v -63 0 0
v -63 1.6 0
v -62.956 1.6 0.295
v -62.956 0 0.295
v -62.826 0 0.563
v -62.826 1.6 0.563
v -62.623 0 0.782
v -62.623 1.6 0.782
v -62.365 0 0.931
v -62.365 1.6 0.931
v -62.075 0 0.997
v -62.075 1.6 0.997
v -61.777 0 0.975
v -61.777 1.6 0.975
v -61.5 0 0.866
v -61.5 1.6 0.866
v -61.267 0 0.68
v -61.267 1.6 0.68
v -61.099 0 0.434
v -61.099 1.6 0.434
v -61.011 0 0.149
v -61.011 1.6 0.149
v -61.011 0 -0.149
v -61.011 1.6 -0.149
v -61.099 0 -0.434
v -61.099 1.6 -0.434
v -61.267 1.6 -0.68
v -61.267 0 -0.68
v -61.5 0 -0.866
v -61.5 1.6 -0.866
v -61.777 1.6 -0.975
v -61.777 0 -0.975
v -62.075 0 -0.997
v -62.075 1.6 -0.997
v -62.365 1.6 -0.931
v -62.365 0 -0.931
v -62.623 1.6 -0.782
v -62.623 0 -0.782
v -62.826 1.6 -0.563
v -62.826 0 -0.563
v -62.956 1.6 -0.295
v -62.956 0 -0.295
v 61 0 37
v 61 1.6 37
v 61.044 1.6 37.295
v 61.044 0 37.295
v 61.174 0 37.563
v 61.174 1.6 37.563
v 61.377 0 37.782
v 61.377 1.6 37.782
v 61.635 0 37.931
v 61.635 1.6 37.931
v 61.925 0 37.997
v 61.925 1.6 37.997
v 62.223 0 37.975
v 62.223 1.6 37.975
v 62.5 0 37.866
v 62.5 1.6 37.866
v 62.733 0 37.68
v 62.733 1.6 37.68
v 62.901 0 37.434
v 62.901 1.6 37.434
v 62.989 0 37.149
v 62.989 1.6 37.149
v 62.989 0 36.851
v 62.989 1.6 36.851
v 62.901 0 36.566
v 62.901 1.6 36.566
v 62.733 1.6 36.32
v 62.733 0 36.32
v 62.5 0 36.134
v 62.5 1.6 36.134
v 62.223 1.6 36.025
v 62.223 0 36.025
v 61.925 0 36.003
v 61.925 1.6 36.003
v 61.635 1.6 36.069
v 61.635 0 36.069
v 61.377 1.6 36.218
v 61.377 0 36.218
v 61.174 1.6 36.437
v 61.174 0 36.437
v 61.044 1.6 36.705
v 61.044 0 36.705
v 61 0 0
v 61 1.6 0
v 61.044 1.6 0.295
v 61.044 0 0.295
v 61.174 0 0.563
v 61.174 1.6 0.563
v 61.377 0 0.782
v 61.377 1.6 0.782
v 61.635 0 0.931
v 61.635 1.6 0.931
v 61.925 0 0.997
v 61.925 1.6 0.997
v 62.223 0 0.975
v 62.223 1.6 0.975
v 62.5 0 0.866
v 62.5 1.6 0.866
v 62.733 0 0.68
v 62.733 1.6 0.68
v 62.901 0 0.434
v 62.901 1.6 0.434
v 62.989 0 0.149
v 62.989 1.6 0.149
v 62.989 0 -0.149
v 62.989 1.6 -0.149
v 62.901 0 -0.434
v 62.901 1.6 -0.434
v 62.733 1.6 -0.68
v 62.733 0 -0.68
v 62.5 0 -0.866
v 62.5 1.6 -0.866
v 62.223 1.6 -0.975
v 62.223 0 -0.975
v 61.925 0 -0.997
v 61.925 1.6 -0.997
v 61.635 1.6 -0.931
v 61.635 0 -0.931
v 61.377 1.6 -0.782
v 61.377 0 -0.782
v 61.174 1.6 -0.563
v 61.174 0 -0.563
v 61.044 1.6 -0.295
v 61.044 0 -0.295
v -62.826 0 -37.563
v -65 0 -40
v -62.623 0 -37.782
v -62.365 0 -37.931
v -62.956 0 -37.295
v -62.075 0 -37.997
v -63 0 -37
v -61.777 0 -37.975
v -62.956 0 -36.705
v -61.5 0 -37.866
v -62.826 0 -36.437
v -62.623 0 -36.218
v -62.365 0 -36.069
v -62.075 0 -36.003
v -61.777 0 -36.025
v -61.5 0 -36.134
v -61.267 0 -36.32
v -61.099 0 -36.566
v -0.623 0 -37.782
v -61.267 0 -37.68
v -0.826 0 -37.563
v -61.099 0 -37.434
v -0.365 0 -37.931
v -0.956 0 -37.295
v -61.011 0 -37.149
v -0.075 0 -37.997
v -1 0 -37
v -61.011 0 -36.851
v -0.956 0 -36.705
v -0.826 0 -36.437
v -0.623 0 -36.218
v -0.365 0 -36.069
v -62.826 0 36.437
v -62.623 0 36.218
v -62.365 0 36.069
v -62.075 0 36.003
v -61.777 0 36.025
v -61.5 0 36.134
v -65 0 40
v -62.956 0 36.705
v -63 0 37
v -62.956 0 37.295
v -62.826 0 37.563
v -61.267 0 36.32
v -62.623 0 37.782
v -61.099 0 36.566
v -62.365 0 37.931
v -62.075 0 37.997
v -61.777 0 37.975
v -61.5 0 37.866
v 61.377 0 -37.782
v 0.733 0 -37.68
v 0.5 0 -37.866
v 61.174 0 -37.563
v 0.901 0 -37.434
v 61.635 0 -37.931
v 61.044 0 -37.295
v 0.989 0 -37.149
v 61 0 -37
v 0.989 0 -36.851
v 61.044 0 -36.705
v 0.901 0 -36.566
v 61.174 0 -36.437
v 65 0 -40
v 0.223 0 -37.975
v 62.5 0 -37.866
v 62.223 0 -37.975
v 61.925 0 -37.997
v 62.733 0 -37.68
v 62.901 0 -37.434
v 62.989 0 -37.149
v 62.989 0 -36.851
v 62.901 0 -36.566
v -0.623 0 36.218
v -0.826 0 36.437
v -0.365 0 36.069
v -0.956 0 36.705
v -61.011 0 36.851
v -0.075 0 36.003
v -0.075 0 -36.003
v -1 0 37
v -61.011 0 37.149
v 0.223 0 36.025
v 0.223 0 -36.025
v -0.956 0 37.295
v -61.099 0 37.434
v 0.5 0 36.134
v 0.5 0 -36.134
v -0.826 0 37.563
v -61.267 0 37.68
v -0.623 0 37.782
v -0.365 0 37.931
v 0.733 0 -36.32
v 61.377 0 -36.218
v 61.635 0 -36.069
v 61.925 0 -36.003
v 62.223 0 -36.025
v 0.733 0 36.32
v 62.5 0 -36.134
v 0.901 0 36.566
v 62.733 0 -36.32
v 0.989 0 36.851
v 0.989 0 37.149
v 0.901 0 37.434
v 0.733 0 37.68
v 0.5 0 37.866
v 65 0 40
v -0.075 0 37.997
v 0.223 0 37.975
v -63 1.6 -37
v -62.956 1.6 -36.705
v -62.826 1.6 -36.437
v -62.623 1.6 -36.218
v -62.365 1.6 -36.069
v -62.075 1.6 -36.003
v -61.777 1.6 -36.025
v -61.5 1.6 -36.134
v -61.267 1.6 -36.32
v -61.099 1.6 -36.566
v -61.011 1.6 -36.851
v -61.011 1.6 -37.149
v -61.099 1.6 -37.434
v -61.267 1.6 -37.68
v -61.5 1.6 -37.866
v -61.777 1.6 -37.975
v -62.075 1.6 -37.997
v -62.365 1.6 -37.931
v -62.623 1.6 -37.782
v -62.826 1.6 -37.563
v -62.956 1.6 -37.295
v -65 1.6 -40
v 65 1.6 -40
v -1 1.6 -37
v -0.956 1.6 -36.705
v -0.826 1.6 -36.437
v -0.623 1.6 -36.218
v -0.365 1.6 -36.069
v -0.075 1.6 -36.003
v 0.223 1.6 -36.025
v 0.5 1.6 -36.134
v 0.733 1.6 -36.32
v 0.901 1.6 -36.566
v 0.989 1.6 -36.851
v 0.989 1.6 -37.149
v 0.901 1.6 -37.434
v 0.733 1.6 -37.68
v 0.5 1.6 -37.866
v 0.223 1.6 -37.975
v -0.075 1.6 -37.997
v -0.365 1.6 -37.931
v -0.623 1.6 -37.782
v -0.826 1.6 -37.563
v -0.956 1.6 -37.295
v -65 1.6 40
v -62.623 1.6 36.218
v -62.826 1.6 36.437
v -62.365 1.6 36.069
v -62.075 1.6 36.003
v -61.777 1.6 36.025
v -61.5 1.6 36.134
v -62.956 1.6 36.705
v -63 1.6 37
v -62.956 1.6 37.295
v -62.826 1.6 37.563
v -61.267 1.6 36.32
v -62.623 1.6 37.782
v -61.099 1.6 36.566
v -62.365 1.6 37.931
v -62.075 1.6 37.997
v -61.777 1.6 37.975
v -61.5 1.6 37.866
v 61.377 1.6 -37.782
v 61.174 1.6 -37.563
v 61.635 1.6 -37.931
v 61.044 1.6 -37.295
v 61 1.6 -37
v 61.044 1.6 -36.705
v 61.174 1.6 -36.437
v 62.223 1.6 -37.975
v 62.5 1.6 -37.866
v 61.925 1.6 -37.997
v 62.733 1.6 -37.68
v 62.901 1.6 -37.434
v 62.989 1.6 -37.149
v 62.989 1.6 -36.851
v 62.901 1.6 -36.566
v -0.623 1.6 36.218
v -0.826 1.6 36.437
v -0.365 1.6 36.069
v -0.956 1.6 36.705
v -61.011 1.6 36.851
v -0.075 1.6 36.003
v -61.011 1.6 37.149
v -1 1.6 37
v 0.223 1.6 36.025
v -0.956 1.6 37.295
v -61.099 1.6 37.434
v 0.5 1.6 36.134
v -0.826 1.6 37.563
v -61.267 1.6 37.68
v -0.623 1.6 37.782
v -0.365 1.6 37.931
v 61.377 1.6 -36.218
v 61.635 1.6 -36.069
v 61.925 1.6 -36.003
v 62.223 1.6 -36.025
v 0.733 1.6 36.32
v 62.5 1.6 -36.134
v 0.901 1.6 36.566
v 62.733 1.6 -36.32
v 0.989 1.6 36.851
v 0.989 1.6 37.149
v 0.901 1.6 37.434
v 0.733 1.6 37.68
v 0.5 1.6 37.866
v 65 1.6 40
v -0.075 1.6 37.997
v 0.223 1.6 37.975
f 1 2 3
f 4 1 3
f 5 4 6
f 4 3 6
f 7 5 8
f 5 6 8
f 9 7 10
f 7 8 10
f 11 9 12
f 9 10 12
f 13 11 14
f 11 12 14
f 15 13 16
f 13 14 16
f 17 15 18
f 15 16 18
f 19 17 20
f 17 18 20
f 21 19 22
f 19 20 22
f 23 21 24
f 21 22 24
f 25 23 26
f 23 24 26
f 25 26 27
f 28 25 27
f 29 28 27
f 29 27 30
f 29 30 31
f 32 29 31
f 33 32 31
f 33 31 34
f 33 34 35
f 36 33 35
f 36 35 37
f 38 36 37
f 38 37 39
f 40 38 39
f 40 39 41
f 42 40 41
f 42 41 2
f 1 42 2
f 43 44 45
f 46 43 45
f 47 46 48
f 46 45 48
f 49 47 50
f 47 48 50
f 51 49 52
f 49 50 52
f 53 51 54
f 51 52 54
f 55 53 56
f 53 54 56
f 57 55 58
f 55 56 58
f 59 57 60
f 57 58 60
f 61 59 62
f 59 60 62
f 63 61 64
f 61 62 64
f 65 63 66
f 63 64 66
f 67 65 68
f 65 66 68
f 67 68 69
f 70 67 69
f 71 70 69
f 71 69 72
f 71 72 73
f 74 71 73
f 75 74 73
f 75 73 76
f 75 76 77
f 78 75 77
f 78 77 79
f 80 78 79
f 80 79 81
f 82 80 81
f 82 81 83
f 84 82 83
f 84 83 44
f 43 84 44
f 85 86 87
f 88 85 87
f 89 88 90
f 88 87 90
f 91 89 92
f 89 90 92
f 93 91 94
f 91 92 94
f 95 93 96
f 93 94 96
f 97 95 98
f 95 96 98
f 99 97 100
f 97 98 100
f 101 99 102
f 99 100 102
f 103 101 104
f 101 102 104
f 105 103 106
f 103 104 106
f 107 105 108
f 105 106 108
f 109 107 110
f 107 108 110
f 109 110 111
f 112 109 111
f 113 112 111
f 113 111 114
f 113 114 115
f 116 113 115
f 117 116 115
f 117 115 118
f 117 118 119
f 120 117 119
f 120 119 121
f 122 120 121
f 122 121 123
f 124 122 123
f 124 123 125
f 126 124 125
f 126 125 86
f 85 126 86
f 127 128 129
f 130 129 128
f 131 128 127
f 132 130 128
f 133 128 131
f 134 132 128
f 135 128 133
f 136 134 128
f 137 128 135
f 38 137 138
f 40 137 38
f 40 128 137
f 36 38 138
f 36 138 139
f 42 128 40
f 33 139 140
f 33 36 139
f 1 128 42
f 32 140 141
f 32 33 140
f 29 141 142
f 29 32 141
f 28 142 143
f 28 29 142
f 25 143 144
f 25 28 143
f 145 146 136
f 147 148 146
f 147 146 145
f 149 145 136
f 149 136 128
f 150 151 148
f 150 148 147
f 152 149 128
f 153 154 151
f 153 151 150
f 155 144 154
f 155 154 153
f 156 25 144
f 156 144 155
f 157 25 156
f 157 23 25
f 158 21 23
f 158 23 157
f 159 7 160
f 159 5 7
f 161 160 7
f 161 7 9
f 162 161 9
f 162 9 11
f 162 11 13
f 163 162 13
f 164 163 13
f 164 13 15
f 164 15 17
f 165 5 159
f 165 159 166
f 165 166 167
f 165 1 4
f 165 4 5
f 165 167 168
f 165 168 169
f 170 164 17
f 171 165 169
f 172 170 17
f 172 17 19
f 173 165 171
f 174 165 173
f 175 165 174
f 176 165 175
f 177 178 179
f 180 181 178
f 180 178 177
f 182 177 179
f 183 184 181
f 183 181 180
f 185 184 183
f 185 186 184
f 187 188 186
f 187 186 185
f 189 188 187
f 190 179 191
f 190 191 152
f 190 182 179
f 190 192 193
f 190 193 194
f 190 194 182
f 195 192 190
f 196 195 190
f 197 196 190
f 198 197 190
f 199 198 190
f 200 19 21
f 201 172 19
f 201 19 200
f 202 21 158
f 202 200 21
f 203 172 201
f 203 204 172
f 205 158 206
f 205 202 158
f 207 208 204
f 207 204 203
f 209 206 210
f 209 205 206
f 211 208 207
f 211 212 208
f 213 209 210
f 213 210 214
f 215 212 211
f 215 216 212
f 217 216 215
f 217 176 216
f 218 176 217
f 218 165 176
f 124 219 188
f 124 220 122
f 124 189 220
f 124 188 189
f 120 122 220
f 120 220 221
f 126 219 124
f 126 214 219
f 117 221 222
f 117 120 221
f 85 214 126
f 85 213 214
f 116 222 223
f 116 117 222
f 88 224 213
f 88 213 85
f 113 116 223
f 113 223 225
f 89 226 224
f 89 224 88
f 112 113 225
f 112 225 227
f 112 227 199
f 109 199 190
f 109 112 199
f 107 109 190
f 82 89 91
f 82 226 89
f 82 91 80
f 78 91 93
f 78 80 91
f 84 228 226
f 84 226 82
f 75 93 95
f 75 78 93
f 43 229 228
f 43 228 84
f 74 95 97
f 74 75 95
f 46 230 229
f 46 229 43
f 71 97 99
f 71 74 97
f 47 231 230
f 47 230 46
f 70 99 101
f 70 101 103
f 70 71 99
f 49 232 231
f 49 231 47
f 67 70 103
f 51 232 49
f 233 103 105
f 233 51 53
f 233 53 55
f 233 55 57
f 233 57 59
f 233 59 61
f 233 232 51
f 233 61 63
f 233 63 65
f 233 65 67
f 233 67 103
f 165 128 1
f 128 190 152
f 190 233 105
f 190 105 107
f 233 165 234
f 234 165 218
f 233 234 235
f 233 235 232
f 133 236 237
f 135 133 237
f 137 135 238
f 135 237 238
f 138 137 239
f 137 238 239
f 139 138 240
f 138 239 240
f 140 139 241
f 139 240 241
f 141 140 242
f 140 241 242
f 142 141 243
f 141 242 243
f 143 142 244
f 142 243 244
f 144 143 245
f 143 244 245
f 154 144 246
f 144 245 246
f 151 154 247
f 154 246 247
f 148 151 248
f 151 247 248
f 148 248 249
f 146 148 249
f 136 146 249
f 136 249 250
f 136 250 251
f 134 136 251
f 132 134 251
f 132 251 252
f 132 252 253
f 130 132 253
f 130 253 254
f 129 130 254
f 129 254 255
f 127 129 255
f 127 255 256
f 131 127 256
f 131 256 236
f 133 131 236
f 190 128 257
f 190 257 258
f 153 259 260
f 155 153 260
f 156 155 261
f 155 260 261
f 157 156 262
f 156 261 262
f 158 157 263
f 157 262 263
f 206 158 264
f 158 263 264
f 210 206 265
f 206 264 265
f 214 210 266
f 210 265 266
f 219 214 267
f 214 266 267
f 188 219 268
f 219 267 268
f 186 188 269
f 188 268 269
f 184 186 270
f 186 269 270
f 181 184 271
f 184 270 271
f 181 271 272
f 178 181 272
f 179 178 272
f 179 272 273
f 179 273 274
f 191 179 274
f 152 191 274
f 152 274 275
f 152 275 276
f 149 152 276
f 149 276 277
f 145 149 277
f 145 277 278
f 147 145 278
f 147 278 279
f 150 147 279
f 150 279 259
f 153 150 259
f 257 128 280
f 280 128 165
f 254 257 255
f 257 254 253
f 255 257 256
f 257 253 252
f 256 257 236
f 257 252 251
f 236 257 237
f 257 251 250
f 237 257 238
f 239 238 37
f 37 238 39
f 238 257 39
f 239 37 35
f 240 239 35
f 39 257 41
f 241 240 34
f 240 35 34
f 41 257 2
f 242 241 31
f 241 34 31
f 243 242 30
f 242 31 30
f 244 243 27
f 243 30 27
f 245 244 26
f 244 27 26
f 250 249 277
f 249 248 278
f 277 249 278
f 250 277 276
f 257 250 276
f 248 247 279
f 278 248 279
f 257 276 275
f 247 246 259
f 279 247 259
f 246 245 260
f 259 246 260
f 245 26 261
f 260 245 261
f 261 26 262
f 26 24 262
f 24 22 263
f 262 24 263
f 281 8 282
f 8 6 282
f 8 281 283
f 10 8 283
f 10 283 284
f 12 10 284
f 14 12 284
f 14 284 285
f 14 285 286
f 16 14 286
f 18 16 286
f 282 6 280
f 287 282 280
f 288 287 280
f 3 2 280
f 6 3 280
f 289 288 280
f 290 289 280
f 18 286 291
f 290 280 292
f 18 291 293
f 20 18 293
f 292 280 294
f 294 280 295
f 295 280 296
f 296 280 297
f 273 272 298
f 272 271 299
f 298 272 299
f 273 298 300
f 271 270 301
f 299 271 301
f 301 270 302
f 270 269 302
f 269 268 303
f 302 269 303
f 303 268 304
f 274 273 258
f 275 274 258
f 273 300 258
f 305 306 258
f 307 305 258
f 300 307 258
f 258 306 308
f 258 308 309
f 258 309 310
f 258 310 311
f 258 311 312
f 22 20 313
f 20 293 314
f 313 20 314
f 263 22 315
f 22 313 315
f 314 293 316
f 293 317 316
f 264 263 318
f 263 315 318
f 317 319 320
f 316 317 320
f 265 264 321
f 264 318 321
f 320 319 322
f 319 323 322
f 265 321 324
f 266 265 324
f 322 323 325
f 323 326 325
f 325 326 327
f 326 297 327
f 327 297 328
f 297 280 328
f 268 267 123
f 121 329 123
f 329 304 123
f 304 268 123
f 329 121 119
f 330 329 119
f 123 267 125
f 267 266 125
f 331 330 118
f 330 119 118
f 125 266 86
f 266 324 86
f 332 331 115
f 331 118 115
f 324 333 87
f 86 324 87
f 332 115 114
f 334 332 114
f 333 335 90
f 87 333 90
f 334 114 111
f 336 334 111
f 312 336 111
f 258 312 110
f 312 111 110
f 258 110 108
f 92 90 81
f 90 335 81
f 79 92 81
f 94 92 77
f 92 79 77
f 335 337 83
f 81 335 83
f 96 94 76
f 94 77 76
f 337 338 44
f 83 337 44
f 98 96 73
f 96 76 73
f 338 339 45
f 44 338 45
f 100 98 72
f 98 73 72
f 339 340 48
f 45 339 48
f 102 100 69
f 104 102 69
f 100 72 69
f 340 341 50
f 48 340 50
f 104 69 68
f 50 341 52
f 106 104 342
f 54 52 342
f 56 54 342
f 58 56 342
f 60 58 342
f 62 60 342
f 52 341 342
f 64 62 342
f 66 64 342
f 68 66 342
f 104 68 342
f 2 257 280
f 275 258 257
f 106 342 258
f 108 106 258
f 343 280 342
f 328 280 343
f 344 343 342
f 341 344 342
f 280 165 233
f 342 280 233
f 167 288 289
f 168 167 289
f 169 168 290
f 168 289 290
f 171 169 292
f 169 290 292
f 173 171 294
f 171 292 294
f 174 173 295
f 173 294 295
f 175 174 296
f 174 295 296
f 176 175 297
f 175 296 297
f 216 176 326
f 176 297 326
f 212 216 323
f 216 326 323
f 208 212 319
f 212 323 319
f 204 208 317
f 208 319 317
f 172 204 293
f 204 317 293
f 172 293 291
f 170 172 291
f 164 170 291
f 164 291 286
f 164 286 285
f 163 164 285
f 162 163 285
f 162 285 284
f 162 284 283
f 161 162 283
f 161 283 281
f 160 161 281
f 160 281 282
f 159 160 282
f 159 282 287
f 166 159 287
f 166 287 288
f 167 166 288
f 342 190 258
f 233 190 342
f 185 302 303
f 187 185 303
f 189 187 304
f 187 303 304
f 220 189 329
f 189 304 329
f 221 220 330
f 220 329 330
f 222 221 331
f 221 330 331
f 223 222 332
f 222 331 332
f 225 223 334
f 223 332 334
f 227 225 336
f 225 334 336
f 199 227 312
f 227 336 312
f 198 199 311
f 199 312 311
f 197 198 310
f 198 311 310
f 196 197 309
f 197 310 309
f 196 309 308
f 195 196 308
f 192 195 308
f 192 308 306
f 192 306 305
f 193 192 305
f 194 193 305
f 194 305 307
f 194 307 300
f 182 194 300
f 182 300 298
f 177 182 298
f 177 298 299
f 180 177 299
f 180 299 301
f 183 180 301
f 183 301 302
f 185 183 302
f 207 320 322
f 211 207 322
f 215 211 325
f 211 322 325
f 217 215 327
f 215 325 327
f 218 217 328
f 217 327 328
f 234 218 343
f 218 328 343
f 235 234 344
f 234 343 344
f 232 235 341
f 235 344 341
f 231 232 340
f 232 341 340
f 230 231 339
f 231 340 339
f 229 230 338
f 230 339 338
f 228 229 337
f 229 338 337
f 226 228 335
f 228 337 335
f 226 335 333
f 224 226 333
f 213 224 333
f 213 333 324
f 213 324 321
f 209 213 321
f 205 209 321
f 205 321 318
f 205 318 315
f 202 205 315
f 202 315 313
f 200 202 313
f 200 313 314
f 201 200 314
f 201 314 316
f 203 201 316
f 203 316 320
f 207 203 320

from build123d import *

# Parameters (mm, degrees)
F0_W     = 130
F0_H     = 80
F1_DEPTH = 1.6
F2_D     = 2


with BuildPart() as f1:
    # F0 (on Front) → F1 (new body)
    with BuildSketch(Plane.XZ):
        Rectangle(F0_W, F0_H)
    extrude(amount=-F1_DEPTH)

    # F2 (through all)
    with Locations(Plane.XZ):
        with Locations((-62, 37), (0, 37), (62, 37), (62, 0), (62, -37), (0, -37), (-62, -37), (-62, 0)):
            Hole(F2_D / 2)


solid = f1.part
